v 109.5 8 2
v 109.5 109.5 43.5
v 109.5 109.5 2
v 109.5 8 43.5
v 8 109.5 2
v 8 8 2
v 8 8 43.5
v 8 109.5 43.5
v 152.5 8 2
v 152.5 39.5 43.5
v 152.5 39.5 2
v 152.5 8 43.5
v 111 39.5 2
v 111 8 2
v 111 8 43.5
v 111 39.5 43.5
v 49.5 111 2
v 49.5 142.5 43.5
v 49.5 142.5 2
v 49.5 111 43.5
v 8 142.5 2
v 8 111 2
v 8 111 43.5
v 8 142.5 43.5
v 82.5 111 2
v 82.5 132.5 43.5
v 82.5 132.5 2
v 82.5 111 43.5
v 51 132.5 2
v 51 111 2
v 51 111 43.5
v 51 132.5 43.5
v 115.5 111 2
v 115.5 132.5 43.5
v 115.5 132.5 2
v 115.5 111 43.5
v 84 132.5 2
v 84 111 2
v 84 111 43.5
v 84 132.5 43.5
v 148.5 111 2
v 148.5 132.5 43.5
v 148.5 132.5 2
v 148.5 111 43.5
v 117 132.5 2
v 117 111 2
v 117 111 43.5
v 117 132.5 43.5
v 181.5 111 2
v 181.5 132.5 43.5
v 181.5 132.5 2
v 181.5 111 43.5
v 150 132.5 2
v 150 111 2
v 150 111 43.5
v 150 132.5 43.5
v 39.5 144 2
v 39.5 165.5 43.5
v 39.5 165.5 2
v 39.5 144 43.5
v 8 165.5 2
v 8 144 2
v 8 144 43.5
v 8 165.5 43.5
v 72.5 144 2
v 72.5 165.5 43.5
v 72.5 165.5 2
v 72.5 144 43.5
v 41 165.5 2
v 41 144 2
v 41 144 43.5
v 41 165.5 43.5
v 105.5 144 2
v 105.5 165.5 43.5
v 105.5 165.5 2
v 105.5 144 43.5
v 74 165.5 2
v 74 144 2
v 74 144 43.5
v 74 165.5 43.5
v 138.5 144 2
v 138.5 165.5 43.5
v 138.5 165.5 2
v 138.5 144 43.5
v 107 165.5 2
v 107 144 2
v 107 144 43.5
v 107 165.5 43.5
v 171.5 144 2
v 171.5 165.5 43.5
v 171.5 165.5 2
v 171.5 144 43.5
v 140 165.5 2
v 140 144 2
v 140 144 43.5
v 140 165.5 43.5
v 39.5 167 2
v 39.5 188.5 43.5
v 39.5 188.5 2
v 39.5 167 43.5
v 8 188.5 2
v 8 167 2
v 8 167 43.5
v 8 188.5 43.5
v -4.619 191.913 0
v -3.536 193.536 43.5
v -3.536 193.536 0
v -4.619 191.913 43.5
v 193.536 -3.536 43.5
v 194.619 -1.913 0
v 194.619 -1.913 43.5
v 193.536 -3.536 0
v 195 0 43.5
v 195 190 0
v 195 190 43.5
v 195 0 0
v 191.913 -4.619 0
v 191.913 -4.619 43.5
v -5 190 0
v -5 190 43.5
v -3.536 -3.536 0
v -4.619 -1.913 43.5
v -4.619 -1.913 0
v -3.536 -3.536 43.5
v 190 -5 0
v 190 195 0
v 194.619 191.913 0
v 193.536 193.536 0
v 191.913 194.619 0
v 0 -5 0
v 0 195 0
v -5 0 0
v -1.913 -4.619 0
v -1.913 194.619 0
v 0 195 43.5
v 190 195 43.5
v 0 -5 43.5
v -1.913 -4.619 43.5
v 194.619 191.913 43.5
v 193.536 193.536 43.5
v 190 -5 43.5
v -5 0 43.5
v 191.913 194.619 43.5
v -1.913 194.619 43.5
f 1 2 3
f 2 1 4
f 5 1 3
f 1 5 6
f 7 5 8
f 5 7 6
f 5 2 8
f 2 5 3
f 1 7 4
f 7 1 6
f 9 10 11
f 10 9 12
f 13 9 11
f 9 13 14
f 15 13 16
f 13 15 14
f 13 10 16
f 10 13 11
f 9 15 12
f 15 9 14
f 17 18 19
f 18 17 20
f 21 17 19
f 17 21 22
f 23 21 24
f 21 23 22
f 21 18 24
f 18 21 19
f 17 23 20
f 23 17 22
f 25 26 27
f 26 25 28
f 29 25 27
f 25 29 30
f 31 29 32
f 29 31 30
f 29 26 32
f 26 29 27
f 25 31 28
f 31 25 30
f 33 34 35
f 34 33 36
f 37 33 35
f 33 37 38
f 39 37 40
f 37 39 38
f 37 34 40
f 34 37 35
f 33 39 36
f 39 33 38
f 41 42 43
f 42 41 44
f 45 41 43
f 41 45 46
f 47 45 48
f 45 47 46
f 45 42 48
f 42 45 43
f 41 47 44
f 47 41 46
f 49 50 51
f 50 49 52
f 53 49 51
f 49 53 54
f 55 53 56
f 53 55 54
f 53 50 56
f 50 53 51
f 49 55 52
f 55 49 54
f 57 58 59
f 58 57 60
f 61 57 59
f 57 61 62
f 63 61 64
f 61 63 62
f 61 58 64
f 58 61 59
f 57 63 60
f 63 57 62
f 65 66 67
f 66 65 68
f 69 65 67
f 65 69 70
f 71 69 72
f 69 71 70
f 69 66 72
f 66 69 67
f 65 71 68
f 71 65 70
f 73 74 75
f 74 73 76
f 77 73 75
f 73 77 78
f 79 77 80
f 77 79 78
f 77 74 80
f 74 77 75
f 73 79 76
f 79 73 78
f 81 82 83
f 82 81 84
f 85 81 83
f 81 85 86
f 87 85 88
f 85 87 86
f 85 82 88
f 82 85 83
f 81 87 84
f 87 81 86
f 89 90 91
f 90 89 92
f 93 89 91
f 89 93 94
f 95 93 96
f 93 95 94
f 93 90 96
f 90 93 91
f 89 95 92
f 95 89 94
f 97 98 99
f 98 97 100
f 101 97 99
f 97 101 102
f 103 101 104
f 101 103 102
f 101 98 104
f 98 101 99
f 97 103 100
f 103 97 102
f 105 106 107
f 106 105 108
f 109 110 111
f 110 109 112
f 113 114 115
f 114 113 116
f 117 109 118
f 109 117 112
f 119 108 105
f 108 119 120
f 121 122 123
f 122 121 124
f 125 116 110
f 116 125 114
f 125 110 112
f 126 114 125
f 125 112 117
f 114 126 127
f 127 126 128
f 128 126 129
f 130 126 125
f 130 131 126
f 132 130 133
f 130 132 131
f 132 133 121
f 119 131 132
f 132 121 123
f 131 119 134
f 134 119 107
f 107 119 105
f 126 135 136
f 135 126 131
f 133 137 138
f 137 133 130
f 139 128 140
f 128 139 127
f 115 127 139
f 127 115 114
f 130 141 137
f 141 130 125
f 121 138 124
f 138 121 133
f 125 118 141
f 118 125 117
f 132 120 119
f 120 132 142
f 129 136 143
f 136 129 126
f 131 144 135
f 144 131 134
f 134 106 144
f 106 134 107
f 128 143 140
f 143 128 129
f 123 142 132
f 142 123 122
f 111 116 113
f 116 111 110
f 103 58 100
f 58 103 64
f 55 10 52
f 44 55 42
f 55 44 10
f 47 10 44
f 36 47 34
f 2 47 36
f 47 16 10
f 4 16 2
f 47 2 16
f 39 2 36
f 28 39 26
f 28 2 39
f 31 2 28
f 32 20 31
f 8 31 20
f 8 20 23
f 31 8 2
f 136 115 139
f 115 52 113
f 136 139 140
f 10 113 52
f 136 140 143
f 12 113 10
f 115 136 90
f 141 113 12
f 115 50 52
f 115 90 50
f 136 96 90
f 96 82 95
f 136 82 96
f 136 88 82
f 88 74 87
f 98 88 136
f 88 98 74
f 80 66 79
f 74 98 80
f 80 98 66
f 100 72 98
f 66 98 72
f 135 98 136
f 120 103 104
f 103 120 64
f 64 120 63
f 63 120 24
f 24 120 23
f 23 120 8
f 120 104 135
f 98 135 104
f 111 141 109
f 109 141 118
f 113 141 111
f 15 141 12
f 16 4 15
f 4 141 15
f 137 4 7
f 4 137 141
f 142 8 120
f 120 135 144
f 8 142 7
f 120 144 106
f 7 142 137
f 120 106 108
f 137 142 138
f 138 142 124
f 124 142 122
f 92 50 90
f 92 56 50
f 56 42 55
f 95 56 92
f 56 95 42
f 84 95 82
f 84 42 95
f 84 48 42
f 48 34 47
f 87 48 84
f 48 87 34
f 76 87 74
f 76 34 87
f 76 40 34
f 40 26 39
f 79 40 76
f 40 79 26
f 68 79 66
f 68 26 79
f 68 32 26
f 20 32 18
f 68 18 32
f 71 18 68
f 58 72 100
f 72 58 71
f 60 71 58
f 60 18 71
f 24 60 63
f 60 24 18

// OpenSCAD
// Generated by SolidPython 1.1.3 on 2026-02-21 18:26:42


difference() {
	linear_extrude(height = 43.5000000000) {
		offset(r = 5.0000000000) {
			square(size = [190.0000000000, 190.0000000000]);
		}
	}
	union() {
		translate(v = [8.0000000000, 8.0000000000, 2.0000000000]) {
			cube(size = [101.5000000000, 101.5000000000, 41.5100000000]);
		}
		translate(v = [111.0000000000, 8.0000000000, 2.0000000000]) {
			cube(size = [41.5000000000, 31.5000000000, 41.5100000000]);
		}
		translate(v = [8.0000000000, 111.0000000000, 2.0000000000]) {
			cube(size = [41.5000000000, 31.5000000000, 41.5100000000]);
		}
		translate(v = [51.0000000000, 111.0000000000, 2.0000000000]) {
			cube(size = [31.5000000000, 21.5000000000, 41.5100000000]);
		}
		translate(v = [84.0000000000, 111.0000000000, 2.0000000000]) {
			cube(size = [31.5000000000, 21.5000000000, 41.5100000000]);
		}
		translate(v = [117.0000000000, 111.0000000000, 2.0000000000]) {
			cube(size = [31.5000000000, 21.5000000000, 41.5100000000]);
		}
		translate(v = [150.0000000000, 111.0000000000, 2.0000000000]) {
			cube(size = [31.5000000000, 21.5000000000, 41.5100000000]);
		}
		translate(v = [8.0000000000, 144.0000000000, 2.0000000000]) {
			cube(size = [31.5000000000, 21.5000000000, 41.5100000000]);
		}
		translate(v = [41.0000000000, 144.0000000000, 2.0000000000]) {
			cube(size = [31.5000000000, 21.5000000000, 41.5100000000]);
		}
		translate(v = [74.0000000000, 144.0000000000, 2.0000000000]) {
			cube(size = [31.5000000000, 21.5000000000, 41.5100000000]);
		}
		translate(v = [107.0000000000, 144.0000000000, 2.0000000000]) {
			cube(size = [31.5000000000, 21.5000000000, 41.5100000000]);
		}
		translate(v = [140.0000000000, 144.0000000000, 2.0000000000]) {
			cube(size = [31.5000000000, 21.5000000000, 41.5100000000]);
		}
		translate(v = [8.0000000000, 167.0000000000, 2.0000000000]) {
			cube(size = [31.5000000000, 21.5000000000, 41.5100000000]);
		}
	}
}
/***********************************************
*********      SolidPython code:      **********
************************************************
 
"""SolidPython geometry building for storage cases."""

from typing import List, Union

from solid import (
    cube,
    difference,
    linear_extrude,
    offset,
    scad_render_to_file,
    square,
    translate,
    union,
)

from .config import Config
from .layout import GridLayoutResult, MixedLayoutResult, SlotRect


def build_base_tray(
    slots: List[SlotRect],
    total_width: float,
    total_length: float,
    config: Config,
):
    """Build the solid base tray (floor + perimeter walls) with slot cavities subtracted."""
    wall = config.wall_thickness
    base_h = config.base_height
    max_height = max(s.height for s in slots)

    if config.case_size is not None:
        outer_x, outer_y = config.case_size
    outer_z = base_h + max_height
    r = config.corner_radius

    if config.case_size is not None:
        pass  # outer_x, outer_y already set
    else:
        corner_inset = (r + 1.0) if r > 0 else 0
        corner_padding = 2 * corner_inset
        outer_x = total_width + 2 * wall + corner_padding
        outer_y = total_length + 2 * wall + corner_padding

    if r > 0:
        # Round only outer corners in XY plane: 2D offset + linear_extrude
        base_2d = square([outer_x - 2 * r, outer_y - 2 * r])
        rounded_2d = offset(r=r)(base_2d)
        outer_box = linear_extrude(height=outer_z)(rounded_2d)
    else:
        outer_box = cube([outer_x, outer_y, outer_z])

    # Subtract each slot cavity (use uniform depth so all slots are clearly visible)
    # Inset by corner_radius + safety margin so cavities don't cut into rounded corners
    cavity_inset = (r + 1.0) if r > 0 else 0
    cavities = []
    for slot in slots:
        cavity = translate([wall + cavity_inset + slot.x, wall + cavity_inset + slot.y, base_h])(
            cube([slot.width, slot.length, max_height + 0.01])  # +epsilon for clean cut
        )
        cavities.append(cavity)

    if cavities:
        tray = difference()(outer_box, union()(*cavities))
    else:
        tray = outer_box

    return tray


def assemble_case(
    layout_result: Union[GridLayoutResult, MixedLayoutResult],
    config: Config,
):
    """Assemble the complete case: base tray with slot cavities (dividers are implicit)."""
    slots = layout_result.slots
    total_width = layout_result.total_width
    total_length = layout_result.total_length

    case = build_base_tray(slots, total_width, total_length, config)
    return case


def render_to_file(assembly, filepath: str) -> None:
    """Render the assembly to an OpenSCAD .scad file."""
    scad_render_to_file(assembly, filepath)
 
 
************************************************/
